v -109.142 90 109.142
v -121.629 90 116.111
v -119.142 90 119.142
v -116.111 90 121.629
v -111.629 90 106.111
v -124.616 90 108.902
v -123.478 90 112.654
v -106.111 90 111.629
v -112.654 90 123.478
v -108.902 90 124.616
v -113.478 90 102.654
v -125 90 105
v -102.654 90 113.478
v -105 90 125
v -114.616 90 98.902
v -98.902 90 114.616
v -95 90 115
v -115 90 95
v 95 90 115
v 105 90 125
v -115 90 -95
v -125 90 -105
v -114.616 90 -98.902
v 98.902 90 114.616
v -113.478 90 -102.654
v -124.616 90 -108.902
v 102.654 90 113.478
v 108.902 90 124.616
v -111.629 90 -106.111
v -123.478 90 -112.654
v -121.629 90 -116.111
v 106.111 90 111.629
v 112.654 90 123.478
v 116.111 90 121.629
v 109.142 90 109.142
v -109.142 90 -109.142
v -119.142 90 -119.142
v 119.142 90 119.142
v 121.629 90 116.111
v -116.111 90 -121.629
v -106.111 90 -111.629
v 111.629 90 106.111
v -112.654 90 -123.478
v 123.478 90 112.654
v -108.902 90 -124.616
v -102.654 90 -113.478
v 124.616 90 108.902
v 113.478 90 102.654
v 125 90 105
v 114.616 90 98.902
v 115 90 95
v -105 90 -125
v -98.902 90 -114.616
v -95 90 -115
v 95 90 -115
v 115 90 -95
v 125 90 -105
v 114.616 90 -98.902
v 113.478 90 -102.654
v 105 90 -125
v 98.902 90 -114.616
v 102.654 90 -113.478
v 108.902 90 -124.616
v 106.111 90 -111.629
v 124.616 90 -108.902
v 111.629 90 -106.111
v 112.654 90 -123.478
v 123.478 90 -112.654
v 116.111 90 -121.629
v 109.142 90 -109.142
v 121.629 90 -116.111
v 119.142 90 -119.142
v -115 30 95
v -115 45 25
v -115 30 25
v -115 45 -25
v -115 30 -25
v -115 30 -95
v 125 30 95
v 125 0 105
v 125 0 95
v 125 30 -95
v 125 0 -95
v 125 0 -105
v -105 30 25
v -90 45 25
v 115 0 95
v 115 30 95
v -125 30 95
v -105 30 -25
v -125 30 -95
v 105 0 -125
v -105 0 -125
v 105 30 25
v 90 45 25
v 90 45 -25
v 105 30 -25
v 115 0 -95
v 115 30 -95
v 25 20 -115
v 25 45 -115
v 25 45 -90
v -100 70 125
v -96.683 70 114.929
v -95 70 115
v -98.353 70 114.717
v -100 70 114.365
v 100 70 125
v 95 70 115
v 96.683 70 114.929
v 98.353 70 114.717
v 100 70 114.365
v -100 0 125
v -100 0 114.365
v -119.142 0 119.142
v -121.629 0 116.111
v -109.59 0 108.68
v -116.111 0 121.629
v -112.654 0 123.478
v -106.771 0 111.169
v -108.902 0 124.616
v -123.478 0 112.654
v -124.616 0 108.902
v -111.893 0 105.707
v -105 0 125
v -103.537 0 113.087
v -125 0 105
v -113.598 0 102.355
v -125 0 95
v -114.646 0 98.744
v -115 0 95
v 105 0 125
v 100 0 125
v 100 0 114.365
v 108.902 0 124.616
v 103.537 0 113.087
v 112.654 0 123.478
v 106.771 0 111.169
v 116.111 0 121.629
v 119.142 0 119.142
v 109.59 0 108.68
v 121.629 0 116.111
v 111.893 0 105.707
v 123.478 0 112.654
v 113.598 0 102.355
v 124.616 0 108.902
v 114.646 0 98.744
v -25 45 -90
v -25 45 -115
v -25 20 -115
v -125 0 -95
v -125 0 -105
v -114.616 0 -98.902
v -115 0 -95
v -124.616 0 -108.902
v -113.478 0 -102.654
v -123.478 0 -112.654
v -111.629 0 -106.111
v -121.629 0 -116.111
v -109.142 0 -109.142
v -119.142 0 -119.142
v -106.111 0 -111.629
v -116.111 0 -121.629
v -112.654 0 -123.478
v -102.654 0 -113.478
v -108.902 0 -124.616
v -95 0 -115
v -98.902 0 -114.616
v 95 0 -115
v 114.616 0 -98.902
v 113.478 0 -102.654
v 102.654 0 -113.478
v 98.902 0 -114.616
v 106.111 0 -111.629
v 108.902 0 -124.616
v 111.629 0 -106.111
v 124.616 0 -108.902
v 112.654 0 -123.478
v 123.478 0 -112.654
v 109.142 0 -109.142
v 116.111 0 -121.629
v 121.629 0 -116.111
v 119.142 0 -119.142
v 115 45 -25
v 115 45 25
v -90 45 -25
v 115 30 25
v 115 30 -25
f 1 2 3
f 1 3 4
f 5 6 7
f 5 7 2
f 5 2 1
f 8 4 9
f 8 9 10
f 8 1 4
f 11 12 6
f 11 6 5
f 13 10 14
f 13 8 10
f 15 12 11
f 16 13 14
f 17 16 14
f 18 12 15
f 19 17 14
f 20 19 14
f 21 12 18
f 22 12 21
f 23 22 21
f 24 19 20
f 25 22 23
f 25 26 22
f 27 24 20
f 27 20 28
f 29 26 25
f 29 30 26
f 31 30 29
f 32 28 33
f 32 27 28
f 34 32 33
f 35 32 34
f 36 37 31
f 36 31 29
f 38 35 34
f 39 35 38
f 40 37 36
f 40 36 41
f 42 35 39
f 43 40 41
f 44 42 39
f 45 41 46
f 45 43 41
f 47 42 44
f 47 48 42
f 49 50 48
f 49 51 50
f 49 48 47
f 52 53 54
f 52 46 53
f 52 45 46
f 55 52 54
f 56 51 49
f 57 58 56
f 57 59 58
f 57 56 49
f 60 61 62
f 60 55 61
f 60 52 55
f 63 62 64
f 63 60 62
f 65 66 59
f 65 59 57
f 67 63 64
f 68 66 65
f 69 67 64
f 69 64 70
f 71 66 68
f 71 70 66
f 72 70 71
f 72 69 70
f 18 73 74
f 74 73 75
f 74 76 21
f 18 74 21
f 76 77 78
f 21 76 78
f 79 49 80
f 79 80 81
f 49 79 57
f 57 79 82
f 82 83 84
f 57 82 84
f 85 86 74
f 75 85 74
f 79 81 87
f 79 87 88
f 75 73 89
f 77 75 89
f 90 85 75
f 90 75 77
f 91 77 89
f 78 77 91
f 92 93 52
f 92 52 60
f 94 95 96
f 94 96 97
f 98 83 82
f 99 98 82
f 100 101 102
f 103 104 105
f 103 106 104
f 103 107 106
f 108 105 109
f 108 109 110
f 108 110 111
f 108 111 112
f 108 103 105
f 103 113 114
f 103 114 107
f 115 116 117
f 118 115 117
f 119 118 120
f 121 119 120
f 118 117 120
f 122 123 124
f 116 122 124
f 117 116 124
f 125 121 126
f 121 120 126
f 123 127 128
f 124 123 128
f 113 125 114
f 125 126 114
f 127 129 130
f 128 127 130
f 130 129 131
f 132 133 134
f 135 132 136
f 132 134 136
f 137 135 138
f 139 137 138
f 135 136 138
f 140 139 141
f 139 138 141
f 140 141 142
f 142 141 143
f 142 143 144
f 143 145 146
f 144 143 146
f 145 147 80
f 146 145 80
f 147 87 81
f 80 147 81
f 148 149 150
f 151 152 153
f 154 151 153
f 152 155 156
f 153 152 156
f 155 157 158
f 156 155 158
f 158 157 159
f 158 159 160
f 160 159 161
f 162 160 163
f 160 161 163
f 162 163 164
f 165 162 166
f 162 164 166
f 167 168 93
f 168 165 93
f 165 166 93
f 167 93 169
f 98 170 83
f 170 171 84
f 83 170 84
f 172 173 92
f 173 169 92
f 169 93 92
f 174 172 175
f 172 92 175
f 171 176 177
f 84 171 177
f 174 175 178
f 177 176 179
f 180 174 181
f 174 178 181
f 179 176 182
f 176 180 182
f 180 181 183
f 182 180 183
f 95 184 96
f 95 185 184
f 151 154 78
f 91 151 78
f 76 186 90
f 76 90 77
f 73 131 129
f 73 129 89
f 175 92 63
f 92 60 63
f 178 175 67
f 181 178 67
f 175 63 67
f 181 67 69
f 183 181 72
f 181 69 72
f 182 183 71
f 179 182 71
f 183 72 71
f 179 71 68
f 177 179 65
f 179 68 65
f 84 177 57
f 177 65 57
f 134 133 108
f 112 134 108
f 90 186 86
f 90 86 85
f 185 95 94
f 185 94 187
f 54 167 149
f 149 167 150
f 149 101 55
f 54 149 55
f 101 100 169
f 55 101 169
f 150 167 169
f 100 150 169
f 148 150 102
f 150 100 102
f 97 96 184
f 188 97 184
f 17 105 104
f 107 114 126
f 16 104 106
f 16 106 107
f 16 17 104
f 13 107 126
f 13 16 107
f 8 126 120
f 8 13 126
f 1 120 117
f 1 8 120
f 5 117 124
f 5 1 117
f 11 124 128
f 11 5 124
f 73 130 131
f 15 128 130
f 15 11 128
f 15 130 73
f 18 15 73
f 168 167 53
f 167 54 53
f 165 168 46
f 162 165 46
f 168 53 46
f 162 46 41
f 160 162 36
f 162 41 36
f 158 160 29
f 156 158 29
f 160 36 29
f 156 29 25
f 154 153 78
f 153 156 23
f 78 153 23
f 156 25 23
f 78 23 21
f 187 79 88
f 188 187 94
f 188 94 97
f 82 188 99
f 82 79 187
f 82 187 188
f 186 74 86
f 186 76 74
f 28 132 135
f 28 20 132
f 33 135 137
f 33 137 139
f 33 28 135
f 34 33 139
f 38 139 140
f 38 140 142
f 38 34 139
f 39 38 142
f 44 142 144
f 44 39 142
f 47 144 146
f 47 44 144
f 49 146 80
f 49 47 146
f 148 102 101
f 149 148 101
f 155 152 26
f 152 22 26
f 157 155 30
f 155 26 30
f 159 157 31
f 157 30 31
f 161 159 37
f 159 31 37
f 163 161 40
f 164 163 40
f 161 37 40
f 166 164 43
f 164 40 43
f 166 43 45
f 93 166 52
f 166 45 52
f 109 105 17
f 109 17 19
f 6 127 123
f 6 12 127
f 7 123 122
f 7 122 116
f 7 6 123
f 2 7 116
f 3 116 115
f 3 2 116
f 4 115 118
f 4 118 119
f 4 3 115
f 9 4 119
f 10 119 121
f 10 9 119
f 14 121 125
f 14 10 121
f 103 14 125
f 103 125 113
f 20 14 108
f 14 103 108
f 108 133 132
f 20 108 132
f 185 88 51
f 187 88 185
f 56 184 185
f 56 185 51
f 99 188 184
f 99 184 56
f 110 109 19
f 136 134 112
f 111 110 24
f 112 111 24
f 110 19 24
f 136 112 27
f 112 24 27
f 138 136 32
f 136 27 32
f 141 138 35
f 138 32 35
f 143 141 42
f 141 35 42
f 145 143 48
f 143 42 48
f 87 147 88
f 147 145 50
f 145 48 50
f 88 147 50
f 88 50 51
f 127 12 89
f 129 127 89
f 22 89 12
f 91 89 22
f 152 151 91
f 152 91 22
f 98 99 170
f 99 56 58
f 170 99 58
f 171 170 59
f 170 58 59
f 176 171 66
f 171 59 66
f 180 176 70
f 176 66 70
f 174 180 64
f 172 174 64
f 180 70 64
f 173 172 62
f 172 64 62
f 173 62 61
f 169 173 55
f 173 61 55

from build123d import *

# Parameters (mm, degrees)
SKETCH1_W           = 250
SKETCH1_H           = 250
SKETCH1_W_2         = 230
SKETCH1_H_2         = 230
BOSS_EXTRUDE1_DEPTH = 90
SKETCH2_W           = 200
SKETCH2_H           = 70
CUT_EXTRUDE1_DEPTH  = 50
FILLET1_R           = 20
BOSS_EXTRUDE2_DEPTH = 25
BOSS_EXTRUDE3_DEPTH = 25
SKETCH6_W           = 190
SKETCH6_H           = 30
CUT_EXTRUDE2_DEPTH  = 251


with BuildPart() as part:
    # Sketch1 → Boss-Extrude1 (new body)
    with BuildSketch(Plane(origin=(0, 0, 0), x_dir=(1, 0, 0), z_dir=(0, 1, 0))):
        Rectangle(SKETCH1_W, SKETCH1_H)
        Rectangle(SKETCH1_W_2, SKETCH1_H_2, mode=Mode.SUBTRACT)
    extrude(amount=BOSS_EXTRUDE1_DEPTH)

    # Sketch2 → Cut-Extrude1 (cut)
    with BuildSketch(Plane.XY.offset(125)):
        with Locations((0, 35)):
            Rectangle(SKETCH2_W, SKETCH2_H)
    extrude(amount=-CUT_EXTRUDE1_DEPTH, mode=Mode.SUBTRACT)

    # Fillet1
    fillet1_edges = [part.edges().sort_by_distance(p)[0] for p in [
        (-115, 45, 115),
        (115, 45, 115),
        (115, 45, -115),
        (-115, 45, -115),
        (-125, 45, 125),
        (125, 45, 125),
        (125, 45, -125),
        (-125, 45, -125),
    ]]
    fillet(fillet1_edges, radius=FILLET1_R)

    # Sketch4 → Boss-Extrude2 (add, symmetric)
    with BuildSketch(Plane.XY):
        Polygon((-115, 45), (-90, 45), (-115, 20), align=None)
        Polygon((115, 45), (90, 45), (115, 20), align=None)
    extrude(amount=BOSS_EXTRUDE2_DEPTH, both=True)

    # Sketch5 → Boss-Extrude3 (add, symmetric)
    with BuildSketch(Plane(origin=(0, 0, 0), x_dir=(0, 0, -1), z_dir=(1, 0, 0))):
        Polygon((115, 45), (115, 20), (90, 45), align=None)
    extrude(amount=BOSS_EXTRUDE3_DEPTH, both=True)

    # Sketch6 → Cut-Extrude2 (cut, through all)
    with BuildSketch(Plane(origin=(125, 0, 0), x_dir=(0, 0, -1), z_dir=(1, 0, 0))):
        with Locations((0, 15)):
            Rectangle(SKETCH6_W, SKETCH6_H)
    extrude(amount=-CUT_EXTRUDE2_DEPTH, mode=Mode.SUBTRACT)


solid = part.part
